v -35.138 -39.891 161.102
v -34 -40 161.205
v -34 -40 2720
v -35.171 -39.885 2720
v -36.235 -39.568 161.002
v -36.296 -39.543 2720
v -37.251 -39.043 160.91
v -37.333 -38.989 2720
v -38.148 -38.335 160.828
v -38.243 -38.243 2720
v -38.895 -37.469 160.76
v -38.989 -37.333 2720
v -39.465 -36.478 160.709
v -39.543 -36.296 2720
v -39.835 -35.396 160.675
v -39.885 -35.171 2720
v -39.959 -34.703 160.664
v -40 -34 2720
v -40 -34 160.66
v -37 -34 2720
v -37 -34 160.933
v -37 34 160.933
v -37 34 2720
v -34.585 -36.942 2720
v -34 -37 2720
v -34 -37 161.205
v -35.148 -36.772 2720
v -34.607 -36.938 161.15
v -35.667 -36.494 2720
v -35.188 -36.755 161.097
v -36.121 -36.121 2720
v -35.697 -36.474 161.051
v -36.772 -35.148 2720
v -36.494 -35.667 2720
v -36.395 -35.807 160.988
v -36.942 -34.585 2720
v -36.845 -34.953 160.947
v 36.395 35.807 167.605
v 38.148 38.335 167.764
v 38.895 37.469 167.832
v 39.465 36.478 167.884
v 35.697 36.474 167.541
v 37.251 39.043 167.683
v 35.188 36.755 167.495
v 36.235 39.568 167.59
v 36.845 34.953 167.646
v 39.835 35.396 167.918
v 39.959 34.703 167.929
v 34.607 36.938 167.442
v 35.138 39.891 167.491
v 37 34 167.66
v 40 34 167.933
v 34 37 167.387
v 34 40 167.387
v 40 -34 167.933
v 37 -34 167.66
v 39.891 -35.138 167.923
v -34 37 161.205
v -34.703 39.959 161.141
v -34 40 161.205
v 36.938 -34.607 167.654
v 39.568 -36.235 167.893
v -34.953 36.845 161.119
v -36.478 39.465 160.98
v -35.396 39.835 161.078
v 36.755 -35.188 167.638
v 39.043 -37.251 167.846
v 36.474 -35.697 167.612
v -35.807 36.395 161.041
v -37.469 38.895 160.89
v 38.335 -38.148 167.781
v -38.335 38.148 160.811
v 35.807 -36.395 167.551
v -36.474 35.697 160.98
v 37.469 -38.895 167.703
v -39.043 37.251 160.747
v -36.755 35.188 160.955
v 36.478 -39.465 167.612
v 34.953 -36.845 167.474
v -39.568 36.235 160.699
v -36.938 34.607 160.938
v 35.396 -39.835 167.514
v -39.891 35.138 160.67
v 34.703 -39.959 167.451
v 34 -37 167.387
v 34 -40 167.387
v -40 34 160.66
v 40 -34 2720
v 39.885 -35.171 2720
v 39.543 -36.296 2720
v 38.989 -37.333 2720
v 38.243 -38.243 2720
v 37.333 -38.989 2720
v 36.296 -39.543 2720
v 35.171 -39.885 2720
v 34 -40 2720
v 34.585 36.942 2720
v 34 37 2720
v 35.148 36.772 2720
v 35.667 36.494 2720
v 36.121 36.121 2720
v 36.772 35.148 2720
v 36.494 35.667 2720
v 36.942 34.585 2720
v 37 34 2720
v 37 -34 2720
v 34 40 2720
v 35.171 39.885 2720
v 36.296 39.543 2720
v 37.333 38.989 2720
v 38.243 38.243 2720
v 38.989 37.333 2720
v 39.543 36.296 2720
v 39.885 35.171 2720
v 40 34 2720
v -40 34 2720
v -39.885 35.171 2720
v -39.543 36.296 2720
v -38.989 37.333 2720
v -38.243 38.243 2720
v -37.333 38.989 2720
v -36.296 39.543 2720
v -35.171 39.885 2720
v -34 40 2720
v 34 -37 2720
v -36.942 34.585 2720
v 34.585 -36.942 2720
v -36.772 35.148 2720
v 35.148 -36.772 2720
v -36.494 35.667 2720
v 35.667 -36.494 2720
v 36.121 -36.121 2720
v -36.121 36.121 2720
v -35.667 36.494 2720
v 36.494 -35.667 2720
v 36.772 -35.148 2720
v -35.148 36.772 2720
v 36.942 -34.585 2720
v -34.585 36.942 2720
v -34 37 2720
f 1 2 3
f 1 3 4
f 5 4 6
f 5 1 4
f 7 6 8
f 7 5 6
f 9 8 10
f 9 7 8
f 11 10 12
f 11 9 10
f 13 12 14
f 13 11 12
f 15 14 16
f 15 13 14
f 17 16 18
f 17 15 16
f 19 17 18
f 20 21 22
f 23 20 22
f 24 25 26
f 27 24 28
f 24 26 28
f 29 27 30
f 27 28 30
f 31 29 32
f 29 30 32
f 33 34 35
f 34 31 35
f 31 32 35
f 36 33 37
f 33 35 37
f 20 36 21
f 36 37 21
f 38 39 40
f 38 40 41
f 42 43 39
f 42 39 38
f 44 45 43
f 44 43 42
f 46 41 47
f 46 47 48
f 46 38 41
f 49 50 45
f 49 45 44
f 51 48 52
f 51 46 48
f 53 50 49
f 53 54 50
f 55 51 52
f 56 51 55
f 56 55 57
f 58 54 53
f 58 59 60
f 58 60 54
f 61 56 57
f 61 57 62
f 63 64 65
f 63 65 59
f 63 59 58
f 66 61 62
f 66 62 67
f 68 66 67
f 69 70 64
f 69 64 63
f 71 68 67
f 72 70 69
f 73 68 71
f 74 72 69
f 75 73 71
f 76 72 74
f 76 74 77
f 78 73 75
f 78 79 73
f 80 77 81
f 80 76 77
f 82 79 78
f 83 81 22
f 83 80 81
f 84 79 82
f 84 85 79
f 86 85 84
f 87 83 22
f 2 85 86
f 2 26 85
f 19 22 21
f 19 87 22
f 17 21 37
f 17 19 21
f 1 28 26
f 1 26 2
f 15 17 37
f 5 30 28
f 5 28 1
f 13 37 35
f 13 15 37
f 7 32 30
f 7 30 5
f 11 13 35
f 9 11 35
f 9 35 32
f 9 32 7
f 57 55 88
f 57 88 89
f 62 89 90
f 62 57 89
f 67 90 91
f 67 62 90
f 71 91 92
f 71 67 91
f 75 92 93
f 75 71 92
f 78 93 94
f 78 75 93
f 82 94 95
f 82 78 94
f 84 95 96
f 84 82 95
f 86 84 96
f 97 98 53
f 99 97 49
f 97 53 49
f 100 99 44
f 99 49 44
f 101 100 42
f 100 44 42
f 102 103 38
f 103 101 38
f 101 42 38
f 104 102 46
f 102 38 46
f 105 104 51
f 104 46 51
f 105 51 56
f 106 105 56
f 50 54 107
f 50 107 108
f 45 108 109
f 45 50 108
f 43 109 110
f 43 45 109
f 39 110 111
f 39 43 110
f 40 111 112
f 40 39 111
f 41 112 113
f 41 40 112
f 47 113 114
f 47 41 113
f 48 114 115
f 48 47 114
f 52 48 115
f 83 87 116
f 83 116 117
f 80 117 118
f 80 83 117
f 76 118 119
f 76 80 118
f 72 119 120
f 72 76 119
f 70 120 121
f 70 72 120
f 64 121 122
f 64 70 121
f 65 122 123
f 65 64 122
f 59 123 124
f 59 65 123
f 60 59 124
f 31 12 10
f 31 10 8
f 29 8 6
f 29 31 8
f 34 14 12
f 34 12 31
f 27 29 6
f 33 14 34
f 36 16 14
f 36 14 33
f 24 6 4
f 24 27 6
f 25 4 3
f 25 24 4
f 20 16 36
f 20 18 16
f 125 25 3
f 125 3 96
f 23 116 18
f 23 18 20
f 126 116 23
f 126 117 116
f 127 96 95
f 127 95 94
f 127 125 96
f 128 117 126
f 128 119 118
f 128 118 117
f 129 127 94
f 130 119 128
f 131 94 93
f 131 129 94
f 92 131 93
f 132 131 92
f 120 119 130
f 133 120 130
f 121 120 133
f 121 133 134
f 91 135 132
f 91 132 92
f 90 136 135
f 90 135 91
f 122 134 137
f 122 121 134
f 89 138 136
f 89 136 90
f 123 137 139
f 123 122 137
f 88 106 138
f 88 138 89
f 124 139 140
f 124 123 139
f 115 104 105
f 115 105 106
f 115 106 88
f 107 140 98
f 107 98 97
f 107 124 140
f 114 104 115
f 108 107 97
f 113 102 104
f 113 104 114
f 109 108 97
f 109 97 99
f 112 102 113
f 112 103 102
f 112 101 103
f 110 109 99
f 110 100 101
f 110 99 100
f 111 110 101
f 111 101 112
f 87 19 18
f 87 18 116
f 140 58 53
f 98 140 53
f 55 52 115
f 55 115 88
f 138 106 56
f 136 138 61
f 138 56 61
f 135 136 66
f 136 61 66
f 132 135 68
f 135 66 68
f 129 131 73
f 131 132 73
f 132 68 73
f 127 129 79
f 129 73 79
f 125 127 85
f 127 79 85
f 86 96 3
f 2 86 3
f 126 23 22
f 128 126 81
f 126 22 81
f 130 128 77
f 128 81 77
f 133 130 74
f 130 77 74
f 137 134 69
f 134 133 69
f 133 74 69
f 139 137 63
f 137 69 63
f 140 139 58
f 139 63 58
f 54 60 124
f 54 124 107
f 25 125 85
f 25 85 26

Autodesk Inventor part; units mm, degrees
ref_plane "Start Plane" through (0, 0, 160.6598) normal (0, 0, 1) x (1, 0, 0)
ref_plane "End Plane" through (0, 0, 2720) normal (0, 0, 1) x (1, 0, 0)
sketch "Sketch" plane through (0, 0, 0) normal (0, 0, 1) x (1, 0, 0)
  line L0 (-40, -34) -> (-40, 34)
  line L1 (-34, 40) -> (34, 40)
  line L2 (40, 34) -> (40, -34)
  line L3 (34, -40) -> (-34, -40)
  arc A0 (-40, -34) -> (-34, -40) centre (-34, -34) ccw
  arc A1 (40, 34) -> (34, 40) centre (34, 34) ccw
  arc A2 (-34, 40) -> (-40, 34) centre (-34, 34) ccw
  arc A3 (34, -40) -> (40, -34) centre (34, -34) ccw
  arc A4 (-34, 37) -> (-37, 34) centre (-34, 34) ccw
  line L4 (-34, 37) -> (34, 37)
  arc A5 (37, 34) -> (34, 37) centre (34, 34) ccw
  line L5 (37, 34) -> (37, -34)
  arc A6 (34, -37) -> (37, -34) centre (34, -34) ccw
  line L6 (34, -37) -> (-34, -37)
  arc A7 (-37, -34) -> (-34, -37) centre (-34, -34) ccw
  line L7 (-37, -34) -> (-37, 34)
  line L8 (0, 57.7397) -> (0, -57.7397) construction
  line L9 (-57.7397, 0) -> (57.7397, 0) construction
  dimension "d7" = 6
  dimension "d9" = 80
  dimension "d11" = 80
  dimension "d12" = 3
  dimension "d15" = 40
  dimension "d16" = 40
extrude "Body" add sketch "Sketch" along normal up to surface (2559.3402 mm away) from surface at 160.6598
sketch "Sketch3" plane through (0, 0, 0) normal (0, 0, 1) x (1, 0, 0)
  line L0 (0, 0) -> (10, 0)
ref_plane "Work Plane3" through (0, 0, 0) normal (0, -1, 0) x (1, 0, 0)
ref_plane "Work Plane4" through (2145.5143, 34, 359.3429) normal (0.0905357, 0, -0.9958932) x (-0.9958932, 0, -0.0905357)
split "Split1" plane through (2145.5143, 34, 359.3429) removes the side toward (0.0905357, 0, -0.9958932)
sketch "Sketch4" plane through (0, 0, 0) normal (0, -1, 0) x (1, 0, 0)
  line L0 (-2, 160.6598) -> (12, 160.6598) projected
  line L1 (-2, 2720) -> (12, 2720) projected
  dimension "d18" = 2559.3402
equation "\"d7\" = G_IR"
equation "\"d9\" = G_W"
equation "\"d11\" = G_H"
equation "\"d12\" = G_T"
equation "\"d15\" = 0.5 * d9"
equation "\"d16\" = 0.5 * d11"
equation "\"d3\" = G_L"
equation "\"G_W\" = 80"
equation "\"G_H\" = 80"
equation "\"G_T\" = 3"
equation "\"G_IR\" = 6"
equation "\"G_L\" = d18"
equation "\"G_OFFSET_START\" = -160.6598"
equation "\"d13\" = -G_OFFSET_START"
properties part number "ISO 10799-2 - 80x80x3 - 2559,34" material "Steel, Mild"
